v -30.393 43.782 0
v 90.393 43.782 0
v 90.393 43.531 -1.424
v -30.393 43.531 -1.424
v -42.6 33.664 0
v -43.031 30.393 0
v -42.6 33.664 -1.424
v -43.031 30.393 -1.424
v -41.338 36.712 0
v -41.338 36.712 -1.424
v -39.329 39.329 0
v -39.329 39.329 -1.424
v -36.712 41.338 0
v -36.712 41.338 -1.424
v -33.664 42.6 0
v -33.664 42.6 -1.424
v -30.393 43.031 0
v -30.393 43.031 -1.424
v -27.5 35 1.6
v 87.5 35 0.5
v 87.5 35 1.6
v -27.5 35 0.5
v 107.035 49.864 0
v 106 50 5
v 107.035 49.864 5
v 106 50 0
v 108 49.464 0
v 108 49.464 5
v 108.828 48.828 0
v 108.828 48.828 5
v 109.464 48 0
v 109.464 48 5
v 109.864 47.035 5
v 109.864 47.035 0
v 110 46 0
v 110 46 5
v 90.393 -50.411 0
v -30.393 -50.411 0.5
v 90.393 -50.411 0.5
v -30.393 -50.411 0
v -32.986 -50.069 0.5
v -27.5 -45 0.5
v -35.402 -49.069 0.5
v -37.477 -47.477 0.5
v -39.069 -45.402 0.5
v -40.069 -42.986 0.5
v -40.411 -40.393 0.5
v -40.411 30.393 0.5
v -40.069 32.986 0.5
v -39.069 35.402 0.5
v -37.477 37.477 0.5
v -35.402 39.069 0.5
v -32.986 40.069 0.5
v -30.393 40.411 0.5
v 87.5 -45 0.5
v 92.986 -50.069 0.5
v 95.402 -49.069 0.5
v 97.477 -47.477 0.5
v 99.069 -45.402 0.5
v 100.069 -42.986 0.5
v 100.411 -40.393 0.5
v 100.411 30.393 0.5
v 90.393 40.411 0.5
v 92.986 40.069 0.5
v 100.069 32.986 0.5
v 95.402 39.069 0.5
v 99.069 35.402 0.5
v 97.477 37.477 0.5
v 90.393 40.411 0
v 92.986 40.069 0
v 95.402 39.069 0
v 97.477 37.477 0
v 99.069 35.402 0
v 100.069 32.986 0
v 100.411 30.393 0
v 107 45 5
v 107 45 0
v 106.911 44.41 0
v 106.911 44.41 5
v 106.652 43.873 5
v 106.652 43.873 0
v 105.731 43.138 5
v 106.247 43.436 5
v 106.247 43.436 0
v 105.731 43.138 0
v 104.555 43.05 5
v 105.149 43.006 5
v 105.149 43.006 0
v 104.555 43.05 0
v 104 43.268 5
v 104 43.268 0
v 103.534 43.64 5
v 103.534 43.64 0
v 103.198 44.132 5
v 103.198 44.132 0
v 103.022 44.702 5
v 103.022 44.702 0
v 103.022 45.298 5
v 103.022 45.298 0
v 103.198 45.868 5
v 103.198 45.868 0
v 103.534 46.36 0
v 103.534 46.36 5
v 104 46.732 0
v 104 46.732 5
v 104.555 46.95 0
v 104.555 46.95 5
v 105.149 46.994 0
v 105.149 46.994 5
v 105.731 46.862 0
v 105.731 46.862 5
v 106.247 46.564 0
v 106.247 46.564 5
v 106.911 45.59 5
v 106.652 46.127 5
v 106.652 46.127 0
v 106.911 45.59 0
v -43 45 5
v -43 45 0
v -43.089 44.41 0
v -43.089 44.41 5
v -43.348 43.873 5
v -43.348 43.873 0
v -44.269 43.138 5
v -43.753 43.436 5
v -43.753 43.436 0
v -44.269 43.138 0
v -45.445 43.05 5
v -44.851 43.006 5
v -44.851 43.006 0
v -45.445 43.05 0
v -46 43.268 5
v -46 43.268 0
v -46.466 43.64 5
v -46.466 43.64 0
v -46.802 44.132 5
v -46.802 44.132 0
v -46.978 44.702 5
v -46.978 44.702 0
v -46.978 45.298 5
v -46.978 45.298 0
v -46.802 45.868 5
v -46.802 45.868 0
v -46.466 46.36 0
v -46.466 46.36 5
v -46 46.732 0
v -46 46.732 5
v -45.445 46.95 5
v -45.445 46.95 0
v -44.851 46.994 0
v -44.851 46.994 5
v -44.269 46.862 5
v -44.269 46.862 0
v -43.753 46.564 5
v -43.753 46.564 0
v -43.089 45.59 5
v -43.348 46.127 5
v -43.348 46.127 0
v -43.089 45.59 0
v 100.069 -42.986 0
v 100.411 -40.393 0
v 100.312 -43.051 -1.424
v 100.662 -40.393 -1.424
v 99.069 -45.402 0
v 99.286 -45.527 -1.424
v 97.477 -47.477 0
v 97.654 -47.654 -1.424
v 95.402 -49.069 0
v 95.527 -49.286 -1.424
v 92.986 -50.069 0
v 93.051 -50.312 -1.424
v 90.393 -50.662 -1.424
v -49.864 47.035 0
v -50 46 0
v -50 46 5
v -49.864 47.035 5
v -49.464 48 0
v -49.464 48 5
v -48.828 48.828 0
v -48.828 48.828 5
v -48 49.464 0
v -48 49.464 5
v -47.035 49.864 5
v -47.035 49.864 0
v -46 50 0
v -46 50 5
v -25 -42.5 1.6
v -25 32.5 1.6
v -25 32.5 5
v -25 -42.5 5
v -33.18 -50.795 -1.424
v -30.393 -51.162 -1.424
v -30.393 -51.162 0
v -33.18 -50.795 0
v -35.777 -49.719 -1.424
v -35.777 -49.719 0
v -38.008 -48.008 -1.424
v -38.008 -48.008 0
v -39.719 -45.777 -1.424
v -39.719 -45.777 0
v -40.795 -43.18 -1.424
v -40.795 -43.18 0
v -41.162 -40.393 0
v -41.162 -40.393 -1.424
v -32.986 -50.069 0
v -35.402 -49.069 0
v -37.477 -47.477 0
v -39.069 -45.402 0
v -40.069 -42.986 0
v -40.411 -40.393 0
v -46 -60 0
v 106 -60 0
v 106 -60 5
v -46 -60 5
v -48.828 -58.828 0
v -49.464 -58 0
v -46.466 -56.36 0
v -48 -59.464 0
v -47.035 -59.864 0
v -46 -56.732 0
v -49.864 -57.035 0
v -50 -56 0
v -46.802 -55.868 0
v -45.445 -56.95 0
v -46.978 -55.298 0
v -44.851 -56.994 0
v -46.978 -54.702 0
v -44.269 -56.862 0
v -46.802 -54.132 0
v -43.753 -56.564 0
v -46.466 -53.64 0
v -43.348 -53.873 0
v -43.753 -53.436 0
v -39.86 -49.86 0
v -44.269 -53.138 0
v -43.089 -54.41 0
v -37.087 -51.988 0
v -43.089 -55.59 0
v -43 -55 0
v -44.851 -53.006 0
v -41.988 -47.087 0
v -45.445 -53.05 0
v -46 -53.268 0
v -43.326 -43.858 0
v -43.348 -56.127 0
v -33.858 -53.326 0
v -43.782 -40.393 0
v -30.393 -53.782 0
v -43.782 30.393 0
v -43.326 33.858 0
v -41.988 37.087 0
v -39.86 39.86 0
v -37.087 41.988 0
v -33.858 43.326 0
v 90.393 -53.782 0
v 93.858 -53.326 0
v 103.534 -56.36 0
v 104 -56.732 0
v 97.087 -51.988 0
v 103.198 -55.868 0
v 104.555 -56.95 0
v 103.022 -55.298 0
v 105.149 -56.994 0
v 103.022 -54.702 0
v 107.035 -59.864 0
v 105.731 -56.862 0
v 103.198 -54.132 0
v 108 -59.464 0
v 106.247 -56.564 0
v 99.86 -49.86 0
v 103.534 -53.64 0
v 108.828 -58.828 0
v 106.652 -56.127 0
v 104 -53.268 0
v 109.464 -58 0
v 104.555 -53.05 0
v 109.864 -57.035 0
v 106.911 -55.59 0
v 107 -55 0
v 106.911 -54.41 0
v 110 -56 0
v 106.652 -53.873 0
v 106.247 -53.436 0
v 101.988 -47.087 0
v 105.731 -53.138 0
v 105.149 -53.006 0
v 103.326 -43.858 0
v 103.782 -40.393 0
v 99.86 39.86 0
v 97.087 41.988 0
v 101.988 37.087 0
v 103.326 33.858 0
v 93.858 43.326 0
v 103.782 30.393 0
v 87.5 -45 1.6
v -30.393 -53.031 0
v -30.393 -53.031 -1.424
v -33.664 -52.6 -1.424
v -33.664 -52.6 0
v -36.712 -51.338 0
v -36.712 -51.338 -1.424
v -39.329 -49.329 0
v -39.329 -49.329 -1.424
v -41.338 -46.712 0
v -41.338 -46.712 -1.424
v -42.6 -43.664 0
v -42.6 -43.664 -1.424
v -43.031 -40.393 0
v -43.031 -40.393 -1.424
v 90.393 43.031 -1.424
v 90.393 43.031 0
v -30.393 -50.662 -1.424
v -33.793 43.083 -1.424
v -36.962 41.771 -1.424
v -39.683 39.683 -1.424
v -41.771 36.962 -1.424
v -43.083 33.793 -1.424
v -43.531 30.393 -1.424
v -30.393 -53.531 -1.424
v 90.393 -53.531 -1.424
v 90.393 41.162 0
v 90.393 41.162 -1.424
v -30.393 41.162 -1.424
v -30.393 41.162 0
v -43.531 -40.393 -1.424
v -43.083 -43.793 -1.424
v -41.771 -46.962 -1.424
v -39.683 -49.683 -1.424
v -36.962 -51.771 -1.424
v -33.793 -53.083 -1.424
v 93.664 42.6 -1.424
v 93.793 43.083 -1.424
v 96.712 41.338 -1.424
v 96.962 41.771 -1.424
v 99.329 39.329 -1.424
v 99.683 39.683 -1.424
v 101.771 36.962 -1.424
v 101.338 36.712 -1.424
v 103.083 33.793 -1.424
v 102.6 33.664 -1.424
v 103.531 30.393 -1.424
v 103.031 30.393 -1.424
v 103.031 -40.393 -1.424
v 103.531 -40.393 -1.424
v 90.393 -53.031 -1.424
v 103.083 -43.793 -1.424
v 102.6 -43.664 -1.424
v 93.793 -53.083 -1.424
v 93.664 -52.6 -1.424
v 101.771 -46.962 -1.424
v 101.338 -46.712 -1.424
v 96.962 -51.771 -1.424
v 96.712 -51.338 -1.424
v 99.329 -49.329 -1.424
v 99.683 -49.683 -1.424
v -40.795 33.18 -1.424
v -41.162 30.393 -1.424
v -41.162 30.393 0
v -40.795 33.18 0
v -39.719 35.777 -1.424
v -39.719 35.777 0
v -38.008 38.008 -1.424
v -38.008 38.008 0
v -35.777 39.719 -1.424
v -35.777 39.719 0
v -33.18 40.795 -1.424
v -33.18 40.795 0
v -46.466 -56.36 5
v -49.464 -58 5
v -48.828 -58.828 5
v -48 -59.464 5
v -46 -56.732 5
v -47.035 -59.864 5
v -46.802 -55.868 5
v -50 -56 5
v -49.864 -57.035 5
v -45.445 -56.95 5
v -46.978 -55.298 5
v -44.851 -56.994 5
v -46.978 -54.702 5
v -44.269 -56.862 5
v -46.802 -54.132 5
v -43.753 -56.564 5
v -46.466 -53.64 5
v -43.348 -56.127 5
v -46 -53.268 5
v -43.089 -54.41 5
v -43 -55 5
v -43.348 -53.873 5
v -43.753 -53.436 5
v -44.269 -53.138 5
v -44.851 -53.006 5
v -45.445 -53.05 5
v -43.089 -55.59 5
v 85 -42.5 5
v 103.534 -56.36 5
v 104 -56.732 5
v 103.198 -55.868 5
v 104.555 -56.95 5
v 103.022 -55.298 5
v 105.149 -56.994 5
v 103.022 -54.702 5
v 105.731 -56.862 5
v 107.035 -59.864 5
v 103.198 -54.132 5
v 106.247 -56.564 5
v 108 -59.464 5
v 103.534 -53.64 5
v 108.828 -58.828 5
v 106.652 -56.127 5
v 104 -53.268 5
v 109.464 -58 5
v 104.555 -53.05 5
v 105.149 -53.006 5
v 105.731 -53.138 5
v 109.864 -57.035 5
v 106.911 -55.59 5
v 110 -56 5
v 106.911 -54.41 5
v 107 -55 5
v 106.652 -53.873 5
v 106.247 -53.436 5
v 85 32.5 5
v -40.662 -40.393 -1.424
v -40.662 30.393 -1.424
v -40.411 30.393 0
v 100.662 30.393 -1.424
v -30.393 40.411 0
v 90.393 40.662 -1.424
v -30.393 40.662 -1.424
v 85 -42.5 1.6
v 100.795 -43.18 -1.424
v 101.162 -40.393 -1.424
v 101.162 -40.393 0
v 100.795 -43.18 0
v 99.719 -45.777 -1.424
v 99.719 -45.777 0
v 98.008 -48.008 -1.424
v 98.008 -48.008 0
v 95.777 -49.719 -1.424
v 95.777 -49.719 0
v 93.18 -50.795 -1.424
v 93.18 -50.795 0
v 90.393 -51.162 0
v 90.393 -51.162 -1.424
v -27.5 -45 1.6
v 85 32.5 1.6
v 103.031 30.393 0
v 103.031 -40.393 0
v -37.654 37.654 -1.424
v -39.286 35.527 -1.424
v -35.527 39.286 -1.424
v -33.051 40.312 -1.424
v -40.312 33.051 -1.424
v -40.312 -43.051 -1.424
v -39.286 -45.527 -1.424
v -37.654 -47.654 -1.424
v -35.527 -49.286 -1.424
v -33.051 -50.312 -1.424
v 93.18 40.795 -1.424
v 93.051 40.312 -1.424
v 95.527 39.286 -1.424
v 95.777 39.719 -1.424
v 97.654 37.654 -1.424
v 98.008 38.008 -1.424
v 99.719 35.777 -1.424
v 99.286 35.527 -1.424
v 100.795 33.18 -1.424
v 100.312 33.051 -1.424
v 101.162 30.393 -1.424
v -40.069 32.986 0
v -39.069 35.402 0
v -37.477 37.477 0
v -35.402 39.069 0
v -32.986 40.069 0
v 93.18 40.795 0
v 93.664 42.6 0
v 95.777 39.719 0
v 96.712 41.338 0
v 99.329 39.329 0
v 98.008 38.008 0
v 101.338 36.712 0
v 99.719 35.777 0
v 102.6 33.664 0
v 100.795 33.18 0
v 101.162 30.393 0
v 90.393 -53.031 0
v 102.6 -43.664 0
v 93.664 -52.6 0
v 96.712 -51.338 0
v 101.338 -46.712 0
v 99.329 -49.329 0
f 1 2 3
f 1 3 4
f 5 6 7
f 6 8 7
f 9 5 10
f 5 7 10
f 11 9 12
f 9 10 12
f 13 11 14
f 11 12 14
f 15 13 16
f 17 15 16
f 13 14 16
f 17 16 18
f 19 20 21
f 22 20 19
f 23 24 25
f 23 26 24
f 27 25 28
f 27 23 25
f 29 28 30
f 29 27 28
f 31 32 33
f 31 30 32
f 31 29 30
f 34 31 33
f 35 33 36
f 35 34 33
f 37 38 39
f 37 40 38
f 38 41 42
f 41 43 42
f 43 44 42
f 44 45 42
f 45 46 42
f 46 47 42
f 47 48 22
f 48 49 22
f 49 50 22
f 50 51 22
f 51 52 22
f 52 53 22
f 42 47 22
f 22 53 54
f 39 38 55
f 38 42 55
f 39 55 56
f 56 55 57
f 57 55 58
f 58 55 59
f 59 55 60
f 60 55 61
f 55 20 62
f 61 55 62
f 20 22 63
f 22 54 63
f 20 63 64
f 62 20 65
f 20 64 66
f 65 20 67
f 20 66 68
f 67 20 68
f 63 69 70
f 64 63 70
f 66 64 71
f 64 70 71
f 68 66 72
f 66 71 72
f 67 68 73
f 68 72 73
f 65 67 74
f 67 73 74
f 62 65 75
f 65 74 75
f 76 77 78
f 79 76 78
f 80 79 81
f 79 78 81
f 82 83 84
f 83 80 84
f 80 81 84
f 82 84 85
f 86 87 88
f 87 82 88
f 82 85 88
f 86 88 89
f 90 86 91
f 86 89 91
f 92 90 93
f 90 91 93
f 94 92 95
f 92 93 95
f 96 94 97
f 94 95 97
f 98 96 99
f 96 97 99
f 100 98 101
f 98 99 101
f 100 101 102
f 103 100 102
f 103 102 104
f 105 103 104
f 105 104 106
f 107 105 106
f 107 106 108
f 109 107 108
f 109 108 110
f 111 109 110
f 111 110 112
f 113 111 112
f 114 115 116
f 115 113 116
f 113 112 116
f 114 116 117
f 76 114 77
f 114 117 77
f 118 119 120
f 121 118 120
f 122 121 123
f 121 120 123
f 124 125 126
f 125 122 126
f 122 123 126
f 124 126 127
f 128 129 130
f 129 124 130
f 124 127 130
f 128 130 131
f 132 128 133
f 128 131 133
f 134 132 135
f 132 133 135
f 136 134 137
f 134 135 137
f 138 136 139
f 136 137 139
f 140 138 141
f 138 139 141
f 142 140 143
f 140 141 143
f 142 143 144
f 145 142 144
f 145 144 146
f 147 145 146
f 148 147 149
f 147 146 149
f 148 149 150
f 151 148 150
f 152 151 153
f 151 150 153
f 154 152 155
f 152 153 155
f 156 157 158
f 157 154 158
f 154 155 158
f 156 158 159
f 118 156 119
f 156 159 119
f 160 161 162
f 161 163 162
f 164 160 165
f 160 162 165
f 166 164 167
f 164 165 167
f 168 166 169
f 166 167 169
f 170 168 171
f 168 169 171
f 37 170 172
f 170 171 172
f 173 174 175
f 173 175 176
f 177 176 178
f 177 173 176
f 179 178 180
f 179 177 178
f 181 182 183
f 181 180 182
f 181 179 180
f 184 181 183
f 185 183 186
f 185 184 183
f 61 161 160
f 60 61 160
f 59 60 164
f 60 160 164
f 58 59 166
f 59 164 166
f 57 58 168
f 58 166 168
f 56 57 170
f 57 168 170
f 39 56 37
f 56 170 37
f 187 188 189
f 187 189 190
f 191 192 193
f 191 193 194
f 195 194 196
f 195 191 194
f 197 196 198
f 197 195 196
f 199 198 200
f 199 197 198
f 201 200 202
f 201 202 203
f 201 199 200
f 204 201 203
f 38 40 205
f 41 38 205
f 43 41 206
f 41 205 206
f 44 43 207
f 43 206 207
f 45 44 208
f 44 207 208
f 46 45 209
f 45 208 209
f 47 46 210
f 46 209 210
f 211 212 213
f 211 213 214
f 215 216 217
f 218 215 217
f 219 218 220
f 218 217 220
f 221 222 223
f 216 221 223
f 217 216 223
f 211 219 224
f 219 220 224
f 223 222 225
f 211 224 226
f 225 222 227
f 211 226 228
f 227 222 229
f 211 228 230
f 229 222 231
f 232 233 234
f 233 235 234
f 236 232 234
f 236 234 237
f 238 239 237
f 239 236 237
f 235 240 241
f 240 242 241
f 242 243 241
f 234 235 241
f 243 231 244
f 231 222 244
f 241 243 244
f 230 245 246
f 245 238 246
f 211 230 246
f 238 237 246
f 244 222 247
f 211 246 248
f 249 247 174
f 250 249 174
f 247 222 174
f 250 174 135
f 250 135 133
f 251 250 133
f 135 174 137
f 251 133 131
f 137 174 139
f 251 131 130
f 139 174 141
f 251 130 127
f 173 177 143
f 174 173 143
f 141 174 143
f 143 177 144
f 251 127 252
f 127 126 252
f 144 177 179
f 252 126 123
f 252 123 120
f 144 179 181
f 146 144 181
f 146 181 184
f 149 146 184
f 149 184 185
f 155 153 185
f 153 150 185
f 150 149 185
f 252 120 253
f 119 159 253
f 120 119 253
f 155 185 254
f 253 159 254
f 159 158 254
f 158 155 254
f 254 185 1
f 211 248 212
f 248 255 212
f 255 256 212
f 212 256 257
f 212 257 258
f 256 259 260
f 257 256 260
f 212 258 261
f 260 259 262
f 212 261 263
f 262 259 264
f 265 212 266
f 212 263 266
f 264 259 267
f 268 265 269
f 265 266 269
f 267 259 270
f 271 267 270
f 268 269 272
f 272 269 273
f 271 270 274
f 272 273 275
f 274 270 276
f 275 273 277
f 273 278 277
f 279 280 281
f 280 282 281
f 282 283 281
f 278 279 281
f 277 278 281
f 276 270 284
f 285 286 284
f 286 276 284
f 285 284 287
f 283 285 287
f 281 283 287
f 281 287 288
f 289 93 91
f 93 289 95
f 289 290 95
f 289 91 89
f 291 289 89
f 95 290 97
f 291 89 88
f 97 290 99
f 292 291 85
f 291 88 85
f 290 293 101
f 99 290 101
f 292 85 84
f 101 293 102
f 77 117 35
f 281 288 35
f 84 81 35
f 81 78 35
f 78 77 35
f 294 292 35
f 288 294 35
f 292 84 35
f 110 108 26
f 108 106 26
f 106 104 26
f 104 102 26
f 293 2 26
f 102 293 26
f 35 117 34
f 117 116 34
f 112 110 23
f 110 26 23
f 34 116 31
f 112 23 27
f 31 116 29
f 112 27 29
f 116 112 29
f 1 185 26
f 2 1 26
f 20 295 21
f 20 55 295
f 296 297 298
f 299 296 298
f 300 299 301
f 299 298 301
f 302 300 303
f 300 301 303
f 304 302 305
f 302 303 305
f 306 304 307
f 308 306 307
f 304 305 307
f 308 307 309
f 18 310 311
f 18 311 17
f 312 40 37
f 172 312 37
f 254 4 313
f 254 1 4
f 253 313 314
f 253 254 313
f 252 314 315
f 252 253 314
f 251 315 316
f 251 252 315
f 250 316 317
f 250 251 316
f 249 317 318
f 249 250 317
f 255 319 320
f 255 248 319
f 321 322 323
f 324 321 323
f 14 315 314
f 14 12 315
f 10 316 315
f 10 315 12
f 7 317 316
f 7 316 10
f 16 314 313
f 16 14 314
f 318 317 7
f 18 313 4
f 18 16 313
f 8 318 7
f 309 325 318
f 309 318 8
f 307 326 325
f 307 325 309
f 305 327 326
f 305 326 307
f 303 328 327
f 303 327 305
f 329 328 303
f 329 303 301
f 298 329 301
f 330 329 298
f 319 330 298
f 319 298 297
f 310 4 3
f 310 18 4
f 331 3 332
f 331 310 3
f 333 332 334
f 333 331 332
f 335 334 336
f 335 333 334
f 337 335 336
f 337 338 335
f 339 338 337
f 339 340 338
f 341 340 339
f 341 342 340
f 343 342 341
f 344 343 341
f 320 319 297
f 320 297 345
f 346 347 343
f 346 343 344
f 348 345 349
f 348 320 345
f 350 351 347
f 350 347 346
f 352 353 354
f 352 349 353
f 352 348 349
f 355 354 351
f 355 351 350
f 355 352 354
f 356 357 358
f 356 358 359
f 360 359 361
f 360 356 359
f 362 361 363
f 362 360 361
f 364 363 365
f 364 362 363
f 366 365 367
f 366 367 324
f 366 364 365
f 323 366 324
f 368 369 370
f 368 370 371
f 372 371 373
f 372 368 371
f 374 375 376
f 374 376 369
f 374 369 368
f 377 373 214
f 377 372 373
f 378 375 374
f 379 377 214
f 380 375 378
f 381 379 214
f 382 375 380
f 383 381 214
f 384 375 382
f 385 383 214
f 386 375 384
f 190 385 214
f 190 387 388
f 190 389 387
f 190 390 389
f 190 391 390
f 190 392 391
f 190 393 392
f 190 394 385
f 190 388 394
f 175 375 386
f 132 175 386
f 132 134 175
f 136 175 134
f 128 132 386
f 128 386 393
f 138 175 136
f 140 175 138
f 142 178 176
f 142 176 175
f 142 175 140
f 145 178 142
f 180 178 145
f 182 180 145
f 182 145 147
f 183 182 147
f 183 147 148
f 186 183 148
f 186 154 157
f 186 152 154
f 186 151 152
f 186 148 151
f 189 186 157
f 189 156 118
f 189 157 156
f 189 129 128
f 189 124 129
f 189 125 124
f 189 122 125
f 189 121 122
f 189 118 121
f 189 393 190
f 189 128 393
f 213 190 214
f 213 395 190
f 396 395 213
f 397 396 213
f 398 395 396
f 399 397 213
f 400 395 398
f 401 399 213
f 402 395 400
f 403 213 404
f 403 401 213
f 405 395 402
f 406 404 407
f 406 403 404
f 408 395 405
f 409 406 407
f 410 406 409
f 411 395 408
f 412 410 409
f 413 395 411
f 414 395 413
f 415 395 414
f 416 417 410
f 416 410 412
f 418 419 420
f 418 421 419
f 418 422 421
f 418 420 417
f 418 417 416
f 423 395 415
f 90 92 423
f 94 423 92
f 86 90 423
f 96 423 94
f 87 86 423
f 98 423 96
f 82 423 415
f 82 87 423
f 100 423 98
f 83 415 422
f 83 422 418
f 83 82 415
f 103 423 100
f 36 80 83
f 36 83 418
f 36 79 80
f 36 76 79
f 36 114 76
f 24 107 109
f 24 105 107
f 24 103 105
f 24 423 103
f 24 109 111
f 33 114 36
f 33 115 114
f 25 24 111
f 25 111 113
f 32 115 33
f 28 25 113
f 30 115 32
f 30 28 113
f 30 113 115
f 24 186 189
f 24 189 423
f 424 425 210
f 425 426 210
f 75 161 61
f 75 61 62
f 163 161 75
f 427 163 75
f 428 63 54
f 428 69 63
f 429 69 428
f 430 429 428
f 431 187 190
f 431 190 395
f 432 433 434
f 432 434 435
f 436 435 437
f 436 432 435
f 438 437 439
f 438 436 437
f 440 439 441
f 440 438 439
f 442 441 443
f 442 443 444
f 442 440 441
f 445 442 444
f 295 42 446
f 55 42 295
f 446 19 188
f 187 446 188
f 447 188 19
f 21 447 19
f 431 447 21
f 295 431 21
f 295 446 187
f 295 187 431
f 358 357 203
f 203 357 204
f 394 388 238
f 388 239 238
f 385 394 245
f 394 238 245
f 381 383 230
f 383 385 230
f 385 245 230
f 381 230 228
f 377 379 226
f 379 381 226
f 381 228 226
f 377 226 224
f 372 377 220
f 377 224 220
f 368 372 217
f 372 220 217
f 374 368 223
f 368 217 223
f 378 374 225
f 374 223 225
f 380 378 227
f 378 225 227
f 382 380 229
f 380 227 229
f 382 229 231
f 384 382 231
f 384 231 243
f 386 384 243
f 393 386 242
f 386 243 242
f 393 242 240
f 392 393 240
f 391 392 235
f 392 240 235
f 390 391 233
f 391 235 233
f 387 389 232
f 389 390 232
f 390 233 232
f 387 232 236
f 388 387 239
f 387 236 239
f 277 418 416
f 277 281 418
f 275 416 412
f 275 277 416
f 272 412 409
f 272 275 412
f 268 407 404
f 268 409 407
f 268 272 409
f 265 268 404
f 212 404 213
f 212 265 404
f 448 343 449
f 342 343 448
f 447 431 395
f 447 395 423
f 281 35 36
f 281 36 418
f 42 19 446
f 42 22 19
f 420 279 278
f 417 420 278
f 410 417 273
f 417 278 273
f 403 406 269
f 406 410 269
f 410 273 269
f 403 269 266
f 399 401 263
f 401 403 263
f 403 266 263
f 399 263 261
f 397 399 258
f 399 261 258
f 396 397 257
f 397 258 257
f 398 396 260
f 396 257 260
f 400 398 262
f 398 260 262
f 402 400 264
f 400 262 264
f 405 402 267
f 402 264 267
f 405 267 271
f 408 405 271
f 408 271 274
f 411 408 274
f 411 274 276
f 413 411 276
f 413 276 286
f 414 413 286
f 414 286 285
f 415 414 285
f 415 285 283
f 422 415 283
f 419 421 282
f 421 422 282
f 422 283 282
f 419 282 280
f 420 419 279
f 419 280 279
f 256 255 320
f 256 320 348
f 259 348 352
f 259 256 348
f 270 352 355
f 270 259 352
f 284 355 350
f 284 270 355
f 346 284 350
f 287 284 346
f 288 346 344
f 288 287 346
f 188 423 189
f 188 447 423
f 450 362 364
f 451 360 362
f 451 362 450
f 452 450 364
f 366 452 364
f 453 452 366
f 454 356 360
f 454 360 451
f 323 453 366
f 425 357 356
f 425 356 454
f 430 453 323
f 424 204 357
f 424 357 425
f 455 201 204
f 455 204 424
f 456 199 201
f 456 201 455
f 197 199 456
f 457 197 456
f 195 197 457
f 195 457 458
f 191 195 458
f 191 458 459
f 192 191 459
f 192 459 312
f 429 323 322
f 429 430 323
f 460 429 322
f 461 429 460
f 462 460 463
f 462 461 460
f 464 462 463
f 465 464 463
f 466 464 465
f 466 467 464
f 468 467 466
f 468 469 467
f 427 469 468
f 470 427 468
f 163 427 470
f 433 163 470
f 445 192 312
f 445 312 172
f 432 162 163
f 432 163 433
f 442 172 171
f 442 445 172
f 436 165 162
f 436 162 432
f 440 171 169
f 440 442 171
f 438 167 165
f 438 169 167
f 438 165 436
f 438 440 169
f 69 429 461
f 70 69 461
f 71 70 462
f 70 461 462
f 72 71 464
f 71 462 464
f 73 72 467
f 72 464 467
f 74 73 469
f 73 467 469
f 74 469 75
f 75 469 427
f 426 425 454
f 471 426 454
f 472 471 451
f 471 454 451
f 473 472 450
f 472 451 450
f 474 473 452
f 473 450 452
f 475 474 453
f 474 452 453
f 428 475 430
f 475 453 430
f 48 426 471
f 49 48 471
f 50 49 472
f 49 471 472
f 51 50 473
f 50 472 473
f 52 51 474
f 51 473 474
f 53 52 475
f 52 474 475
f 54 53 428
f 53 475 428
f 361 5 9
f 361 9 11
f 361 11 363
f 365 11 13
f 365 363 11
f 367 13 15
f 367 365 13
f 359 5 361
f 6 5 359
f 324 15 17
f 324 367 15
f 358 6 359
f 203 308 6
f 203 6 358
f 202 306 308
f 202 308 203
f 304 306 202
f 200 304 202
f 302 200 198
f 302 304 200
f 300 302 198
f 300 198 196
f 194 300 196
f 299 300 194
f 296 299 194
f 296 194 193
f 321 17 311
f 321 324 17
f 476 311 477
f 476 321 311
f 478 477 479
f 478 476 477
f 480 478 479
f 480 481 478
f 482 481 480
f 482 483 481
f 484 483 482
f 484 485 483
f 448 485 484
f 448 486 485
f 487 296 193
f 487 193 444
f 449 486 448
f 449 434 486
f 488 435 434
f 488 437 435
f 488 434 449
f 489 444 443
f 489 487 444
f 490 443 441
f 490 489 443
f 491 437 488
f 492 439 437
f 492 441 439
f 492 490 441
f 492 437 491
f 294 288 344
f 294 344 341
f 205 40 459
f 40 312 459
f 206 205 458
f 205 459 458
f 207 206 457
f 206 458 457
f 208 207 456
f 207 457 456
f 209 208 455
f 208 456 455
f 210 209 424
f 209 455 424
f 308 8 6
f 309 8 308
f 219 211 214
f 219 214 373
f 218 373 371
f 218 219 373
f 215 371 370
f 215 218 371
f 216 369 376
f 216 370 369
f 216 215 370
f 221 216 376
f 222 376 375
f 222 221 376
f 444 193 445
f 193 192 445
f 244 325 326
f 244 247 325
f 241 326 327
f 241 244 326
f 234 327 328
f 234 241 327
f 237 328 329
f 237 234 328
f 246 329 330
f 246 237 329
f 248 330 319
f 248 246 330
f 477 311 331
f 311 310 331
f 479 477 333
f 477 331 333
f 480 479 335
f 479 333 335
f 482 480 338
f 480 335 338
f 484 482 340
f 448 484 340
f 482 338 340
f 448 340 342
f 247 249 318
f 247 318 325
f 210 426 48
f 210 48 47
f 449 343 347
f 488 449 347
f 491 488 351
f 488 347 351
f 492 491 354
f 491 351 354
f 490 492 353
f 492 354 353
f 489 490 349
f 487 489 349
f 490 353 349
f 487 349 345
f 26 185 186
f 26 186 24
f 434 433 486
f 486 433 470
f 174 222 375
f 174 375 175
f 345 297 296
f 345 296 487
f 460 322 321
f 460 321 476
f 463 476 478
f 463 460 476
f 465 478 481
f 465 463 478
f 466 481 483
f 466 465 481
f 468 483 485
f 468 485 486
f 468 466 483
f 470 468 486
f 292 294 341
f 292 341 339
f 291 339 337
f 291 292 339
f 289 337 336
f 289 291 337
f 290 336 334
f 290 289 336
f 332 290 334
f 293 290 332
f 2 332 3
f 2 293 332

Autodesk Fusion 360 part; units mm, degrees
sketch "Sketch2" plane through (0, 0, 0) normal (0, 0, 1) x (1, 0, 0)
  line L0 (-46, 50) -> (106, 50)
  line L1 (110, 46) -> (110, -56)
  line L2 (106, -60) -> (-46, -60)
  line L3 (-50, -56) -> (-50, 46)
  circle A0 centre (-45, 45) radius 2
  line L4 (30, -60) -> (30, 50) construction
  line L5 (-50, -5) -> (110, -5) construction
  arc A1 (-46, 50) -> (-50, 46) centre (-46, 46) ccw
  circle A2 centre (105, 45) radius 2
  arc A3 (110, 46) -> (106, 50) centre (106, 46) ccw
  circle A4 centre (105, -55) radius 2
  arc A5 (106, -60) -> (110, -56) centre (106, -56) ccw
  circle A6 centre (-45, -55) radius 2
  arc A7 (-50, -56) -> (-46, -60) centre (-46, -56) ccw
  point P0 (-50, 50)
  point P1 (110, 50)
  dimension "d3" = 4
  dimension "d4" = 5
  dimension "d5" = 5
  dimension "d6" = 4
  dimension "d63" = 160
  dimension "d64" = 110
extrude "Extrude1" add sketch "Sketch2" along normal blind 5
sketch "Sketch3" plane through (0, 0, 0) normal (0, 0, -1) x (1, 0, 0)
  circle A0 centre (105, 55) radius 2
  circle A1 centre (-45, 55) radius 2
  circle A2 centre (-45, -45) radius 2
  circle A3 centre (105, -45) radius 2
  arc A4 (-50, -46) -> (-46, -50) centre (-46, -46) ccw
  line L0 (-46, -50) -> (106, -50)
  arc A5 (106, -50) -> (110, -46) centre (106, -46) ccw
  line L1 (110, -46) -> (110, 56)
  arc A6 (110, 56) -> (106, 60) centre (106, 56) ccw
  line L2 (106, 60) -> (-46, 60)
  arc A7 (-46, 60) -> (-50, 56) centre (-46, 56) ccw
  line L3 (-50, 56) -> (-50, -46)
  line L4 (30, 60) -> (30, -50) construction
  line L5 (110, 5) -> (-50, 5) construction
  line L6 (102.0964, -42.0964) -> (-42.0964, -42.0964) construction
  line L7 (-42.0964, -42.0964) -> (-42.0964, 52.0964) construction
  line L8 (-42.0964, 52.0964) -> (102.0964, 52.0964) construction
  line L9 (102.0964, 52.0964) -> (102.0964, -42.0964) construction
  line L10 (102.0964, -42.0964) -> (-42.0964, 52.0964) construction
  line L11 (-42.0964, -42.0964) -> (102.0964, 52.0964) construction
  line L12 (90.3929, -43.5309) -> (-30.3929, -43.5309)
  line L13 (-43.5309, -30.3929) -> (-43.5309, 40.3929)
  line L14 (-30.3929, 53.5309) -> (90.3929, 53.5309)
  line L15 (103.5309, 40.3929) -> (103.5309, -30.3929)
  line L16 (88.8372, -33.833) -> (-43.5309, 53.5309) construction
  line L17 (-37.4412, -35.28) -> (85.6746, 38.2522) construction
  line L18 (-40.6619, -30.3929) -> (-40.6619, 40.3929)
  line L19 (-30.3929, 50.6619) -> (90.3929, 50.6619)
  line L20 (100.6619, 40.3929) -> (100.6619, -30.3929)
  line L21 (98.0436, -38.97) -> (-40.6619, 50.6619) construction
  line L22 (-34.7613, -32.5014) -> (82.9436, 35.6581) construction
  arc A8 (-30.3929, 50.6619) -> (-40.6619, 40.3929) centre (-30.3929, 40.3929) ccw
  arc A9 (-30.3929, 53.5309) -> (-43.5309, 40.3929) centre (-30.3929, 40.3929) ccw
  arc A10 (100.6619, 40.3929) -> (90.3929, 50.6619) centre (90.3929, 40.3929) ccw
  arc A11 (103.5309, 40.3929) -> (90.3929, 53.5309) centre (90.3929, 40.3929) ccw
  arc A12 (-40.6619, -30.3929) -> (-30.3929, -40.6619) centre (-30.3929, -30.3929) ccw
  arc A13 (-43.5309, -30.3929) -> (-30.3929, -43.5309) centre (-30.3929, -30.3929) ccw
  arc A14 (90.3929, -40.6619) -> (100.6619, -30.3929) centre (90.3929, -30.3929) ccw
  arc A15 (90.3929, -43.5309) -> (103.5309, -30.3929) centre (90.3929, -30.3929) ccw
  line L23 (90.3929, -40.6619) -> (-30.3929, -40.6619)
  point P0 (30, 5)
  point P1 (30, 5)
  point P2 (30, 5)
  point P3 (30, 5)
  point P4 (30, 5)
  dimension "d25" = 144.1928
  dimension "d27" = 94.1928
  dimension "d28" = 1.4345
  dimension "d29" = 1.4345
  dimension "d30" = 1.4345
  dimension "d31" = 1.4345
  dimension "d44" = 10.269
  dimension "d45" = 13.138
extrude "Extrude4" add sketch "Sketch3" along normal blind 1.424 contours L12 L13 L14 L15 A9 A11 A13 A15
draft "Draft3" angle 10 neutral plane through (0, 0, -1.424) pull (0, 0, -1) 16 faces at (9.869, -50.6619, -0.9493) (96.3495, -48.7578, -0.9493) (100.6619, -16.7976, -0.4747) (92.8139, 40.3724, -0.9493) (9.869, 40.6619, -0.9493) (-33.7516, 40.0971, -0.9493) (-40.6619, 6.7976, -0.4747) (-40.0971, -43.7516, -0.9493) (-43.5309, 6.7976, -0.4747) (-38.0137, 41.0948, -0.9493) (50.131, 43.5309, -0.4747) (103.516, 31.018, -0.9493) (103.5309, -16.7976, -0.9493) (99.4592, -49.9013, -0.9493) (9.869, -53.5309, -0.4747) (-38.5143, -50.7201, -0.9493)
sketch "Sketch5" plane through (0, 0, -1.424) normal (0, 0, -1) x (1, 0, 0)
  line L0 (-30.3929, 50.6619) -> (90.3929, 50.6619)
  line L1 (100.6619, 40.3929) -> (100.6619, -30.3929)
  line L2 (90.3929, -40.6619) -> (-30.3929, -40.6619)
  line L3 (-40.6619, -30.3929) -> (-40.6619, 40.3929)
  line L4 (90.3929, 53.5309) -> (-30.3929, 53.5309)
  line L5 (-43.5309, 40.3929) -> (-43.5309, -30.3929)
  line L6 (-30.3929, -43.5309) -> (90.3929, -43.5309)
  line L7 (103.5309, -30.3929) -> (103.5309, 40.3929)
  line L8 (30, 53.5309) -> (30, -43.5309) construction
  line L9 (103.5309, 5) -> (-43.5309, 5) construction
  line L10 (102.0964, -42.0964) -> (-42.0964, -42.0964) construction
  line L11 (-42.0964, -42.0964) -> (-42.0964, 52.0964) construction
  line L12 (-42.0964, 52.0964) -> (102.0964, 52.0964) construction
  line L13 (102.0964, 52.0964) -> (102.0964, -42.0964) construction
  line L14 (102.0964, -42.0964) -> (-42.0964, 52.0964) construction
  line L15 (-42.0964, -42.0964) -> (102.0964, 52.0964) construction
  line L16 (90.3929, -43.0309) -> (-30.3929, -43.0309)
  line L17 (-43.0309, -30.3929) -> (-43.0309, 40.3929)
  line L18 (-30.3929, 53.0309) -> (90.3929, 53.0309)
  line L19 (103.0309, 40.3929) -> (103.0309, -30.3929)
  line L20 (88.9806, -33.7903) -> (-43.0309, 53.0309) construction
  line L21 (-43.0309, -43.0309) -> (88.9807, 43.7903) construction
  line L22 (90.3929, -41.1619) -> (-30.3929, -41.1619)
  line L23 (-41.1619, -30.3929) -> (-41.1619, 40.3929)
  line L24 (101.1619, 40.3929) -> (101.1619, -30.3929)
  line L25 (88.054, -32.659) -> (-41.1619, 51.1619) construction
  line L26 (-41.1619, -41.1619) -> (88.054, 42.659) construction
  arc A0 (100.6619, 40.3929) -> (90.3929, 50.6619) centre (90.3929, 40.3929) ccw
  arc A1 (90.3929, -40.6619) -> (100.6619, -30.3929) centre (90.3929, -30.3929) ccw
  arc A2 (-40.6619, -30.3929) -> (-30.3929, -40.6619) centre (-30.3929, -30.3929) ccw
  arc A3 (-30.3929, 50.6619) -> (-40.6619, 40.3929) centre (-30.3929, 40.3929) ccw
  arc A4 (-43.5309, -30.3929) -> (-30.3929, -43.5309) centre (-30.3929, -30.3929) ccw
  arc A5 (90.3929, -43.5309) -> (103.5309, -30.3929) centre (90.3929, -30.3929) ccw
  arc A6 (103.5309, 40.3929) -> (90.3929, 53.5309) centre (90.3929, 40.3929) ccw
  arc A7 (-30.3929, 53.5309) -> (-43.5309, 40.3929) centre (-30.3929, 40.3929) ccw
  arc A8 (-30.3929, 51.1619) -> (-41.1619, 40.3929) centre (-30.3929, 40.3929) ccw
  arc A9 (-30.3929, 53.0309) -> (-43.0309, 40.3929) centre (-30.3929, 40.3929) ccw
  arc A10 (101.1619, 40.3929) -> (90.3929, 51.1619) centre (90.3929, 40.3929) ccw
  arc A11 (103.0309, 40.3929) -> (90.3929, 53.0309) centre (90.3929, 40.3929) ccw
  line L27 (-30.3929, 51.1619) -> (90.3929, 51.1619)
  arc A12 (90.3929, -41.1619) -> (101.1619, -30.3929) centre (90.3929, -30.3929) ccw
  arc A13 (90.3929, -43.0309) -> (103.0309, -30.3929) centre (90.3929, -30.3929) ccw
  arc A14 (-41.1619, -30.3929) -> (-30.3929, -41.1619) centre (-30.3929, -30.3929) ccw
  arc A15 (-43.0309, -30.3929) -> (-30.3929, -43.0309) centre (-30.3929, -30.3929) ccw
  point P0 (30, 5)
  point P1 (30, 5)
  point P2 (30, 5)
  dimension "d36" = 144.1928
  dimension "d37" = 94.1928
  dimension "d38" = 0.9345
  dimension "d39" = 0.9345
  dimension "d40" = 0.9345
  dimension "d41" = 0.9345
  dimension "d50" = 10.769
  dimension "d51" = 12.638
extrude "Extrude6" cut sketch "Sketch5" against normal blind 1.424 contours L16 L17 L18 L19 A9 A11 A13 A15
extrude "Extrude7" cut 1 faces at (50.131, -20.1369, 0) along direction (0, 0, 1) blind 0.5
sketch "Sketch6" plane through (0, 0, 0.5) normal (0, 0, -1) x (1, 0, 0)
  line L0 (90.3929, 50.4108) -> (-30.3929, 50.4108)
  arc A0 (-30.3929, 50.4108) -> (-40.4108, 40.3929) centre (-30.3929, 40.3929) ccw
  line L1 (-40.4108, 40.3929) -> (-40.4108, -30.3929)
  arc A1 (-40.4108, -30.3929) -> (-30.3929, -40.4108) centre (-30.3929, -30.3929) ccw
  line L2 (-30.3929, -40.4108) -> (90.3929, -40.4108)
  arc A2 (90.3929, -40.4108) -> (100.4108, -30.3929) centre (90.3929, -30.3929) ccw
  line L3 (100.4108, -30.3929) -> (100.4108, 40.3929)
  arc A3 (100.4108, 40.3929) -> (90.3929, 50.4108) centre (90.3929, 40.3929) ccw
  line L4 (30, 50.4108) -> (30, -40.4108) construction
  line L5 (-40.4108, 5) -> (100.4108, 5) construction
  line L6 (87.5, -35) -> (-27.5, -35)
  line L7 (-27.5, -35) -> (-27.5, 45)
  line L8 (-27.5, 45) -> (87.5, 45)
  line L9 (87.5, 45) -> (87.5, -35)
  line L10 (87.5, -35) -> (-27.5, 45) construction
  line L11 (-27.5, -35) -> (87.5, 45) construction
  point P0 (30, 5)
  dimension "d58" = 115
  dimension "d59" = 80
extrude "Extrude8" cut sketch "Sketch6" against normal blind 1.1 contours L6 L7 L8 L9
sketch "Sketch7" plane through (0, 0, 1.6) normal (0, 0, -1) x (1, 0, 0)
  line L0 (87.5, 45) -> (-27.5, 45)
  line L1 (-27.5, 45) -> (-27.5, -35)
  line L2 (-27.5, -35) -> (87.5, -35)
  line L3 (87.5, -35) -> (87.5, 45)
  line L4 (30, 45) -> (30, -35) construction
  line L5 (87.5, 5) -> (-27.5, 5) construction
  line L6 (85, -32.5) -> (-25, -32.5)
  line L7 (-25, -32.5) -> (-25, 42.5)
  line L8 (-25, 42.5) -> (85, 42.5)
  line L9 (85, 42.5) -> (85, -32.5)
  line L10 (85, -32.5) -> (-25, 42.5) construction
  line L11 (-25, -32.5) -> (85, 42.5) construction
  point P0 (30, 5)
  dimension "d62" = 110
  dimension "d65" = 75
extrude "Extrude9" cut sketch "Sketch7" against normal blind 8.4 contours L6 L7 L8 L9
equation "ORingDiameter = 1.78 mm" comment "Diamter of the O ring"
equation "ORingInnerDiameter = 150 mm" comment "Inner diamter of the o ring bore"
equation "d25 = ( ORingPerimeter - 100 mm ) / 4 + 50 mm"
equation "ORingPerimeter = 2 * 3.1412 * ( ( ORingInnerDiameter / 2 ) + ORingDiameter / 2 )"
equation "d27 = ( ORingPerimeter - 100 mm ) / 4"
equation "d28 = ( ( ORingDiameter * 1.05 ) / 2 ) + 0.5 mm"
equation "d29 = ( ( ORingDiameter * 1.05 ) / 2 ) + 0.5 mm"
equation "d30 = ( ( ORingDiameter * 1.05 ) / 2 ) + 0.5 mm"
equation "d31 = ( ( ORingDiameter * 1.05 ) / 2 ) + 0.5 mm"
equation "d32 = ORingDiameter * 0.8"
equation "d36 = ( ORingPerimeter - 100 mm ) / 4 + 50 mm"
equation "d37 = ( ORingPerimeter - 100 mm ) / 4"
equation "d38 = ( ORingDiameter * 1.05 ) / 2"
equation "d39 = ( ORingDiameter * 1.05 ) / 2"
equation "d40 = ( ORingDiameter * 1.05 ) / 2"
equation "d41 = ( ORingDiameter * 1.05 ) / 2"
equation "d44 = ( ORingDiameter ) * 6 + ORingDiameter * 0.05 - 0.5 mm"
equation "d45 = ( ORingDiameter ) * 6 + ( ORingDiameter * 1.1 ) + 0.5 mm"
equation "d50 = ( ORingDiameter ) * 6 + ORingDiameter * 0.05 - 0.0 mm"
equation "d51 = ( ORingDiameter ) * 6 + ORingDiameter * 1.1 + 0 mm"
equation "d52 = -( ORingDiameter * 0.8 )"
equation "PanelWidth = 80 mm"
equation "PanelLength = 115 mm"
equation "d58 = PanelLength"
equation "d59 = PanelWidth"
equation "d62 = PanelLength - 5 mm"
equation "d65 = PanelWidth - 5 mm"
